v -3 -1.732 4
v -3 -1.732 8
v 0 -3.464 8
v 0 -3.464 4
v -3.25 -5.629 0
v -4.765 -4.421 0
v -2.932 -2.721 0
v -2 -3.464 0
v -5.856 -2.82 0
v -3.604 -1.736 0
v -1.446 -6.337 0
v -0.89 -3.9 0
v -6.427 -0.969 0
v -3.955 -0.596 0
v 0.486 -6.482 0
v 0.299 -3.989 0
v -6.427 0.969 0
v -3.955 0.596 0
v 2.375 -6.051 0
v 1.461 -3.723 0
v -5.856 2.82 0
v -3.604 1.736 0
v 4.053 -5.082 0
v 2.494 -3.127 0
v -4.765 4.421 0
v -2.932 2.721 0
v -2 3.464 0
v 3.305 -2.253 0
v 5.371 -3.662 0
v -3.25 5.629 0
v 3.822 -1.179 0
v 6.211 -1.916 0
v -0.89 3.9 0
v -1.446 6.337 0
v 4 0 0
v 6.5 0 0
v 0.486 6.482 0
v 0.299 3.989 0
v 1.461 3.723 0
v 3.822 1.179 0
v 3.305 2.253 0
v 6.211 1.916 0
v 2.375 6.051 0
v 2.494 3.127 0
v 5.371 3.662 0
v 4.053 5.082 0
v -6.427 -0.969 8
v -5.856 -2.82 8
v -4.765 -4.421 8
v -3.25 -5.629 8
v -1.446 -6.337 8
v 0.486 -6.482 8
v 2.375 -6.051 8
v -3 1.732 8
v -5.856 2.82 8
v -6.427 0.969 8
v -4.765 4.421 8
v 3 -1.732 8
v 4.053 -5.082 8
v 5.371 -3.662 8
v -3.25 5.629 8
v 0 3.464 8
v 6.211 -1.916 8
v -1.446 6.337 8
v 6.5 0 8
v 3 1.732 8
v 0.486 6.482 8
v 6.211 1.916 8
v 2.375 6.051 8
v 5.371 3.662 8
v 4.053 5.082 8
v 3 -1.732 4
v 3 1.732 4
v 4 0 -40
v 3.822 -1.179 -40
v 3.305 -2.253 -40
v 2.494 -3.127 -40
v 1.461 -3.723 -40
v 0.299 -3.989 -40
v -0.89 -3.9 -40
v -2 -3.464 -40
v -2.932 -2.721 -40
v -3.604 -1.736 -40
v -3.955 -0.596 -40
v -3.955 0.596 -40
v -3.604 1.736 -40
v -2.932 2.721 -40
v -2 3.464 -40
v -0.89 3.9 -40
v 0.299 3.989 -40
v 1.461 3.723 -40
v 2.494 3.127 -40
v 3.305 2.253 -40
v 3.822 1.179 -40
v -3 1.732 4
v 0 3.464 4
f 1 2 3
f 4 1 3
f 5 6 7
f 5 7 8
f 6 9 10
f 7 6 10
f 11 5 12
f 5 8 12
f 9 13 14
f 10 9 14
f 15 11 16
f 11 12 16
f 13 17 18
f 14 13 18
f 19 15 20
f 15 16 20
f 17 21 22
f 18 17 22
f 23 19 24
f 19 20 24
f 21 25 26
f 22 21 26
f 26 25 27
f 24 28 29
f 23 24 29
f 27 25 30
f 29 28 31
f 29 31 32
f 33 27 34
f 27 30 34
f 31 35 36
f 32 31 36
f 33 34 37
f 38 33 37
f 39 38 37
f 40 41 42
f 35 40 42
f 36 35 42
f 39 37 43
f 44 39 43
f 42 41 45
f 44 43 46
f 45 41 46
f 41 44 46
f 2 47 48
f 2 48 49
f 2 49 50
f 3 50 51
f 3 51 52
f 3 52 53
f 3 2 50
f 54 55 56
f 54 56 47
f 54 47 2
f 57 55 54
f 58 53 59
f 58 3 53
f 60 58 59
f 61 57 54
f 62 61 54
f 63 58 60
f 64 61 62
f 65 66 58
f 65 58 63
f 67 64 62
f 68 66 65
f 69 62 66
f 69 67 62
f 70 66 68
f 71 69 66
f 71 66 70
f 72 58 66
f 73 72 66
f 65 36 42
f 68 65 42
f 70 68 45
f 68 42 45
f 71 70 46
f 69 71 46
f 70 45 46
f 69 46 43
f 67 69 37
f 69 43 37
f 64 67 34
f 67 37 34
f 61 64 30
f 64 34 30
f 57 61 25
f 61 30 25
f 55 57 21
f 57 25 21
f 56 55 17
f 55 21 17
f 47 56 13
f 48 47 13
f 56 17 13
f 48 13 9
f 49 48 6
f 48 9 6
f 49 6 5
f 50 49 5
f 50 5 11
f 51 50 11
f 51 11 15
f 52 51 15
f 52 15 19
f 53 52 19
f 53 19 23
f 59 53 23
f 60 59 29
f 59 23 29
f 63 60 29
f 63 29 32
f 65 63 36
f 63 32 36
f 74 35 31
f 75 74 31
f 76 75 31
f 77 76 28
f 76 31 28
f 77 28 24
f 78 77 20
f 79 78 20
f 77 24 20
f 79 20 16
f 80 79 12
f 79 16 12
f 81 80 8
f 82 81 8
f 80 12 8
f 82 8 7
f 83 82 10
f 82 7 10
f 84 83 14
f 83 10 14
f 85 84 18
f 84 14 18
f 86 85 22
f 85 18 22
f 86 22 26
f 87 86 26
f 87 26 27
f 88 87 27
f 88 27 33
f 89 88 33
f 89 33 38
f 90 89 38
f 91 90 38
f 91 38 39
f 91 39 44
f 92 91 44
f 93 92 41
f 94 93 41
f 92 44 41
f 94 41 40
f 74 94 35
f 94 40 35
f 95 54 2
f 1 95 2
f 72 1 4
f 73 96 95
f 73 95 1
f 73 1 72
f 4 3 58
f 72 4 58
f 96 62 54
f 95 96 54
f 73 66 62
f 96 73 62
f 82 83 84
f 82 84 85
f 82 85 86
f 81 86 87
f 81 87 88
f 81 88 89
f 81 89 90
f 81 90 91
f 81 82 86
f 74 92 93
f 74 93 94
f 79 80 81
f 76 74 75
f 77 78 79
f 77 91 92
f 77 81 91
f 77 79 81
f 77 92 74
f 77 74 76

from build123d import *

# Parameters (mm, degrees)
F0_R     = 6.5
F1_DEPTH = 8
F3_DEPTH = 4
F4_R     = 4
F5_DEPTH = 40


with BuildPart() as f1:
    # F0 (on Top) → F1 (new body)
    with BuildSketch(Plane.XY):
        Circle(F0_R)
    extrude(amount=F1_DEPTH)

    # F2 (on face) → F3 (cut)
    with BuildSketch(Plane.XY.offset(8)):
        Polygon((3, 1.732051), (0, 3.464102), (-3, 1.732051), (-3, -1.732051), (0, -3.464102), (3, -1.732051), align=None)
    extrude(amount=-F3_DEPTH, mode=Mode.SUBTRACT)

    # F4 (on face) → F5 (join)
    with BuildSketch(Plane(origin=(0, 0, 0), x_dir=(1, 0, 0), z_dir=(0, 0, -1))):
        Circle(F4_R)
    extrude(amount=F5_DEPTH)


solid = f1.part
